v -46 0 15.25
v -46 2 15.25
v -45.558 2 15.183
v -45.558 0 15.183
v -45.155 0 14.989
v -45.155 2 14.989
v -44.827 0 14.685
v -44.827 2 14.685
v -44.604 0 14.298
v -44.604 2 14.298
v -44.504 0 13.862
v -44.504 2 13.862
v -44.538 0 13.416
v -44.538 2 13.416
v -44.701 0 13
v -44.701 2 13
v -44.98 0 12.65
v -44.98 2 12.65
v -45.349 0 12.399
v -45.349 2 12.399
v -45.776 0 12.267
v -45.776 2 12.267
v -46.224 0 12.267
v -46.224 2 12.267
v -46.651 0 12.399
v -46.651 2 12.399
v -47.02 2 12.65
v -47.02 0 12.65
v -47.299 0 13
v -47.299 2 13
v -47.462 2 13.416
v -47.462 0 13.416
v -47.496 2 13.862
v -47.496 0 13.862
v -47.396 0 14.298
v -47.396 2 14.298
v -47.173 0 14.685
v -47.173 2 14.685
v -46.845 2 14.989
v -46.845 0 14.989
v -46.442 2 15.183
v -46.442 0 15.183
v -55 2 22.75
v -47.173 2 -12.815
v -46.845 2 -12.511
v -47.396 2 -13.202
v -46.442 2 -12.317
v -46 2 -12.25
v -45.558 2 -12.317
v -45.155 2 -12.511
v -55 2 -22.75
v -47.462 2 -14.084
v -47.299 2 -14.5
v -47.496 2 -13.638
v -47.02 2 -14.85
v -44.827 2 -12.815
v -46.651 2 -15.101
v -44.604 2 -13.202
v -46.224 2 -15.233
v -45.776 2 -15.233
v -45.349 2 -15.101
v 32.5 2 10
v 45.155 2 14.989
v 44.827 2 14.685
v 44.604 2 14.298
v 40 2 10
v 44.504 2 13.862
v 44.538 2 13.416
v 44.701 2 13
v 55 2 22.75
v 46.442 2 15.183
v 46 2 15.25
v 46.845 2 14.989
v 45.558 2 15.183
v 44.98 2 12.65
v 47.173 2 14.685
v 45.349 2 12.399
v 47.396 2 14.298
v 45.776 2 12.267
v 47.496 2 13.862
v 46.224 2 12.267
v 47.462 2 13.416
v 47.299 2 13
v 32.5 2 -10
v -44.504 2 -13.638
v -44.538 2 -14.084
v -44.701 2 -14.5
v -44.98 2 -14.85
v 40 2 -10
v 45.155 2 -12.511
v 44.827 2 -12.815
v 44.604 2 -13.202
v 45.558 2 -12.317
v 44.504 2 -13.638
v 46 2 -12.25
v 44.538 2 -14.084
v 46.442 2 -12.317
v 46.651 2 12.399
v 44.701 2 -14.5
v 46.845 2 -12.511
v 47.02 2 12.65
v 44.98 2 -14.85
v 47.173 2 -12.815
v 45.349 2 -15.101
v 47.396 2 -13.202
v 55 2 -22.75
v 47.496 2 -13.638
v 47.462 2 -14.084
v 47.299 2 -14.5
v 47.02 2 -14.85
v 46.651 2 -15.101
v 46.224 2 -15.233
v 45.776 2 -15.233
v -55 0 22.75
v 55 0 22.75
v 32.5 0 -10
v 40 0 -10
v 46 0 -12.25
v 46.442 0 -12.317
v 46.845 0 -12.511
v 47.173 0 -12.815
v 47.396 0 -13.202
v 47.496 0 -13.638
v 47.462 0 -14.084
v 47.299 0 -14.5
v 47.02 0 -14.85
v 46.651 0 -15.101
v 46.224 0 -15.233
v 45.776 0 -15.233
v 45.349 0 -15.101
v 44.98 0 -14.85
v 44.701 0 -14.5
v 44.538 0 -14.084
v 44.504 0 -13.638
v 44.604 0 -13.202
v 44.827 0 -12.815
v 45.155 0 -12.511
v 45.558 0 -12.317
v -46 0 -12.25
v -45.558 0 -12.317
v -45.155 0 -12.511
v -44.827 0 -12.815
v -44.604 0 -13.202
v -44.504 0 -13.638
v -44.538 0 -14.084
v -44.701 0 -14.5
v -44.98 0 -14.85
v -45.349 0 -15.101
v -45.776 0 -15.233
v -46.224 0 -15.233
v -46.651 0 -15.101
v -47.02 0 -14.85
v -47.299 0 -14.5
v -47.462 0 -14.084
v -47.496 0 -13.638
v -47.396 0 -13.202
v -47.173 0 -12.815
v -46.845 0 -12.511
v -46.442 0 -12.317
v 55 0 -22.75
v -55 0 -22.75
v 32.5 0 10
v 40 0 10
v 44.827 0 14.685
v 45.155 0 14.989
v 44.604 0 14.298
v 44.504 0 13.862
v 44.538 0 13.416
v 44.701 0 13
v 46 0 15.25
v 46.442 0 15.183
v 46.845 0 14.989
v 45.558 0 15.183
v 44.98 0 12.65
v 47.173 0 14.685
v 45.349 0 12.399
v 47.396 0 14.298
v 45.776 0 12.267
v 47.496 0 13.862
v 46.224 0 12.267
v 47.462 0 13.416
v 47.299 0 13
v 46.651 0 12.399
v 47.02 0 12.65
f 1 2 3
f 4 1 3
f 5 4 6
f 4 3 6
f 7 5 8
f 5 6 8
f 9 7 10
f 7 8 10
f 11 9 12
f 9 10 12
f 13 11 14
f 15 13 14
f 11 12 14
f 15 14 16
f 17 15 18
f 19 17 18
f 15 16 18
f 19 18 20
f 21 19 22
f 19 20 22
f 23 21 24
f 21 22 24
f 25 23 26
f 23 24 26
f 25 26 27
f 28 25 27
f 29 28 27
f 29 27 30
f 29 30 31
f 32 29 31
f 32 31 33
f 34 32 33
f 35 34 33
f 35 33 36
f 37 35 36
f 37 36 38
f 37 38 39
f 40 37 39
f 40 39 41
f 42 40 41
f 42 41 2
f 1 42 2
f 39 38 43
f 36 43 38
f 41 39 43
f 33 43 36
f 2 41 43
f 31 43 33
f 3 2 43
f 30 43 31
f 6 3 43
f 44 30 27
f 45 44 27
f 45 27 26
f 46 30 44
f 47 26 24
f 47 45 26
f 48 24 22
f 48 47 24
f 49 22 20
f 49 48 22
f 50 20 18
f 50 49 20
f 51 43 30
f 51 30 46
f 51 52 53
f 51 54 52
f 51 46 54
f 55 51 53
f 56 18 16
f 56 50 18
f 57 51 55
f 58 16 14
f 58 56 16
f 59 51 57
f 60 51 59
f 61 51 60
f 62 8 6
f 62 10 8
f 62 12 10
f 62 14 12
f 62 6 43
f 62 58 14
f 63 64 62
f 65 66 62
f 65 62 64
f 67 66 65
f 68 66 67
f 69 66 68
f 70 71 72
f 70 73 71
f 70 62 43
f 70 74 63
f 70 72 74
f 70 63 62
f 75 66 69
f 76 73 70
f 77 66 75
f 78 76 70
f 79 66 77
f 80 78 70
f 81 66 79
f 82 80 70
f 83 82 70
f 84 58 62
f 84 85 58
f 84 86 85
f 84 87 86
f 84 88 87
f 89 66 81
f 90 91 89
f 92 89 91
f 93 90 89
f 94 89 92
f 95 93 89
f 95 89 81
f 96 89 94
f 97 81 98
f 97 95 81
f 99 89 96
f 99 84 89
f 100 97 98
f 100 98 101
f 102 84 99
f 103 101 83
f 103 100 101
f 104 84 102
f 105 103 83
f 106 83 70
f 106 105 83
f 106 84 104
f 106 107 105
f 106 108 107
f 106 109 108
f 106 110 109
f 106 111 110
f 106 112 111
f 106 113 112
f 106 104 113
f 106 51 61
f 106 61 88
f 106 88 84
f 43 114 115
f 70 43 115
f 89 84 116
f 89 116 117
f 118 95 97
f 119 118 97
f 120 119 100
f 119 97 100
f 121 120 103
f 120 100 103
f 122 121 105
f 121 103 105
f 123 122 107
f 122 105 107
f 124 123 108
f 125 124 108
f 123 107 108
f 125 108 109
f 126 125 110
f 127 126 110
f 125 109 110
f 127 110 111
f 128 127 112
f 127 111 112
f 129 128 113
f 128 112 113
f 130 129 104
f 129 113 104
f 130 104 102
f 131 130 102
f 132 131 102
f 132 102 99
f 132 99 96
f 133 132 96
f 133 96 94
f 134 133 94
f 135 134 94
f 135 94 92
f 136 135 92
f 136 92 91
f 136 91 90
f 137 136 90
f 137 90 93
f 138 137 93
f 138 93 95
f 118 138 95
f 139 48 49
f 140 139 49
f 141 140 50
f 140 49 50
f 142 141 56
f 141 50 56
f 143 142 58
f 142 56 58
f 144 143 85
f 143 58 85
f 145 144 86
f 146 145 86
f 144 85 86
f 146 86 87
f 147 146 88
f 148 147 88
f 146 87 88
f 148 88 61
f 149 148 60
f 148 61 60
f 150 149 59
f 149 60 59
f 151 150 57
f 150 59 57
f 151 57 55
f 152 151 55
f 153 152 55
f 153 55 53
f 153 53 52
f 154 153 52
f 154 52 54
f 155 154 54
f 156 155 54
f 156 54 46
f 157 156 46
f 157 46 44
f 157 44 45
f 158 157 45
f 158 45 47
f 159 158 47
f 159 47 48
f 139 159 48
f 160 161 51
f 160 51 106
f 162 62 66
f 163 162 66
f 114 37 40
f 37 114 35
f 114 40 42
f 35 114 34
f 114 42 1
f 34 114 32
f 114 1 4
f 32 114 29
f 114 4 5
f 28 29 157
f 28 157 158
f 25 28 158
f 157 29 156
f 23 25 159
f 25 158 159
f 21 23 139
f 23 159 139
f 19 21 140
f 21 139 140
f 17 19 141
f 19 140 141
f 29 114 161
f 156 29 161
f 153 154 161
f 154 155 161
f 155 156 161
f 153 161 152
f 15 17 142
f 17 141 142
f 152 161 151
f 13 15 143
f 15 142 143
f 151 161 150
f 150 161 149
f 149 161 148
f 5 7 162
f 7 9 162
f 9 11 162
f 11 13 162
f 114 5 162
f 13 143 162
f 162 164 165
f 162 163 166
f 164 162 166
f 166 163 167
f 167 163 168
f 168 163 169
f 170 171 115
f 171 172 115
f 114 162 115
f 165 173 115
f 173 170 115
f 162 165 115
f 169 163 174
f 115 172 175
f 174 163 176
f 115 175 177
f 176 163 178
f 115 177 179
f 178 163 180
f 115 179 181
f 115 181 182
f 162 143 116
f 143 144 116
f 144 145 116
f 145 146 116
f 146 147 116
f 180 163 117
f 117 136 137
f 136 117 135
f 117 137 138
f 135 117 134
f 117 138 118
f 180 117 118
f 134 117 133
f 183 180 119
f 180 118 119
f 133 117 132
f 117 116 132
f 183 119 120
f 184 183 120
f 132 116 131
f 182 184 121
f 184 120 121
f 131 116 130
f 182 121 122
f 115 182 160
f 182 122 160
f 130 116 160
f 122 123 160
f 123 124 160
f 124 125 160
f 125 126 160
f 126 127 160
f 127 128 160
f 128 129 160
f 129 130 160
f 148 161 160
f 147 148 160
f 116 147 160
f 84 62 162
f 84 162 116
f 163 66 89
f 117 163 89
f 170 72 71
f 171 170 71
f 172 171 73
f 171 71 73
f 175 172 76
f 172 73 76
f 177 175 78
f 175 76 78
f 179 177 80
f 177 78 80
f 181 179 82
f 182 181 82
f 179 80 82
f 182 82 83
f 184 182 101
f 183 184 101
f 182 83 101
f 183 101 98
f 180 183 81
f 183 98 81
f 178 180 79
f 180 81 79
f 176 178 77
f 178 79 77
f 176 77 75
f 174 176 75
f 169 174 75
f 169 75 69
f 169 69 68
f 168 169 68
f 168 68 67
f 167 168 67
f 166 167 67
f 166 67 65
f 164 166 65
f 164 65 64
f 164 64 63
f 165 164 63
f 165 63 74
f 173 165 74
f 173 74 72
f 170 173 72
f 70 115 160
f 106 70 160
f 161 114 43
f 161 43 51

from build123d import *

# Parameters (mm, degrees)
SKETCH1_W           = 110
SKETCH1_H           = 45.5
BOSS_EXTRUDE1_DEPTH = 2
CUT_EXTRUDE1_REACH  = 61.553
SKETCH2_R           = 1.5
SKETCH2_W           = 7.5
SKETCH2_H           = 20


with BuildPart() as part:
    # Sketch1 → Boss-Extrude1 (new body)
    with BuildSketch(Plane(origin=(0, 0, 0), x_dir=(1, 0, 0), z_dir=(0, 1, 0))):
        Rectangle(SKETCH1_W, SKETCH1_H)
    extrude(amount=BOSS_EXTRUDE1_DEPTH)

    # Sketch2 → Cut-Extrude1 (cut, up to next)
    with BuildSketch(Plane(origin=(0, 2, 0), x_dir=(1, 0, 0), z_dir=(0, 1, 0)), mode=Mode.PRIVATE) as cut_extrude1_sk1:
        with Locations(Location((-46, -13.75, 0), (0, 0, 270))):
            Circle(SKETCH2_R)
    cut_extrude1_tool1 = extrude(cut_extrude1_sk1.sketch, amount=-CUT_EXTRUDE1_REACH, mode=Mode.PRIVATE) & part.part
    # Sketch2 → Cut-Extrude1 (cut, up to next)
    with BuildSketch(Plane(origin=(0, 2, 0), x_dir=(1, 0, 0), z_dir=(0, 1, 0)), mode=Mode.PRIVATE) as cut_extrude1_sk2:
        with Locations(Location((-46, 13.75, 0), (0, 0, 270))):
            Circle(SKETCH2_R)
    cut_extrude1_tool2 = extrude(cut_extrude1_sk2.sketch, amount=-CUT_EXTRUDE1_REACH, mode=Mode.PRIVATE) & part.part
    # Sketch2 → Cut-Extrude1 (cut, up to next)
    with BuildSketch(Plane(origin=(0, 2, 0), x_dir=(1, 0, 0), z_dir=(0, 1, 0)), mode=Mode.PRIVATE) as cut_extrude1_sk3:
        with Locations(Location((46, 13.75, 0), (0, 0, 270))):
            Circle(SKETCH2_R)
    cut_extrude1_tool3 = extrude(cut_extrude1_sk3.sketch, amount=-CUT_EXTRUDE1_REACH, mode=Mode.PRIVATE) & part.part
    # Sketch2 → Cut-Extrude1 (cut, up to next)
    with BuildSketch(Plane(origin=(0, 2, 0), x_dir=(1, 0, 0), z_dir=(0, 1, 0)), mode=Mode.PRIVATE) as cut_extrude1_sk4:
        with Locations(Location((46, -13.75, 0), (0, 0, 270))):
            Circle(SKETCH2_R)
    cut_extrude1_tool4 = extrude(cut_extrude1_sk4.sketch, amount=-CUT_EXTRUDE1_REACH, mode=Mode.PRIVATE) & part.part
    # Sketch2 → Cut-Extrude1 (cut, up to next)
    with BuildSketch(Plane(origin=(0, 2, 0), x_dir=(1, 0, 0), z_dir=(0, 1, 0)), mode=Mode.PRIVATE) as cut_extrude1_sk5:
        with Locations((36.25, 0)):
            Rectangle(SKETCH2_W, SKETCH2_H)
    cut_extrude1_tool5 = extrude(cut_extrude1_sk5.sketch, amount=-CUT_EXTRUDE1_REACH, mode=Mode.PRIVATE) & part.part
    add(cut_extrude1_tool1.solids().sort_by_distance((-46, 2, 13.75))[0], mode=Mode.SUBTRACT)
    add(cut_extrude1_tool2.solids().sort_by_distance((-46, 2, -13.75))[0], mode=Mode.SUBTRACT)
    add(cut_extrude1_tool3.solids().sort_by_distance((46, 2, -13.75))[0], mode=Mode.SUBTRACT)
    add(cut_extrude1_tool4.solids().sort_by_distance((46, 2, 13.75))[0], mode=Mode.SUBTRACT)
    add(cut_extrude1_tool5.solids().sort_by_distance((36.25, 2, 0))[0], mode=Mode.SUBTRACT)


solid = part.part
